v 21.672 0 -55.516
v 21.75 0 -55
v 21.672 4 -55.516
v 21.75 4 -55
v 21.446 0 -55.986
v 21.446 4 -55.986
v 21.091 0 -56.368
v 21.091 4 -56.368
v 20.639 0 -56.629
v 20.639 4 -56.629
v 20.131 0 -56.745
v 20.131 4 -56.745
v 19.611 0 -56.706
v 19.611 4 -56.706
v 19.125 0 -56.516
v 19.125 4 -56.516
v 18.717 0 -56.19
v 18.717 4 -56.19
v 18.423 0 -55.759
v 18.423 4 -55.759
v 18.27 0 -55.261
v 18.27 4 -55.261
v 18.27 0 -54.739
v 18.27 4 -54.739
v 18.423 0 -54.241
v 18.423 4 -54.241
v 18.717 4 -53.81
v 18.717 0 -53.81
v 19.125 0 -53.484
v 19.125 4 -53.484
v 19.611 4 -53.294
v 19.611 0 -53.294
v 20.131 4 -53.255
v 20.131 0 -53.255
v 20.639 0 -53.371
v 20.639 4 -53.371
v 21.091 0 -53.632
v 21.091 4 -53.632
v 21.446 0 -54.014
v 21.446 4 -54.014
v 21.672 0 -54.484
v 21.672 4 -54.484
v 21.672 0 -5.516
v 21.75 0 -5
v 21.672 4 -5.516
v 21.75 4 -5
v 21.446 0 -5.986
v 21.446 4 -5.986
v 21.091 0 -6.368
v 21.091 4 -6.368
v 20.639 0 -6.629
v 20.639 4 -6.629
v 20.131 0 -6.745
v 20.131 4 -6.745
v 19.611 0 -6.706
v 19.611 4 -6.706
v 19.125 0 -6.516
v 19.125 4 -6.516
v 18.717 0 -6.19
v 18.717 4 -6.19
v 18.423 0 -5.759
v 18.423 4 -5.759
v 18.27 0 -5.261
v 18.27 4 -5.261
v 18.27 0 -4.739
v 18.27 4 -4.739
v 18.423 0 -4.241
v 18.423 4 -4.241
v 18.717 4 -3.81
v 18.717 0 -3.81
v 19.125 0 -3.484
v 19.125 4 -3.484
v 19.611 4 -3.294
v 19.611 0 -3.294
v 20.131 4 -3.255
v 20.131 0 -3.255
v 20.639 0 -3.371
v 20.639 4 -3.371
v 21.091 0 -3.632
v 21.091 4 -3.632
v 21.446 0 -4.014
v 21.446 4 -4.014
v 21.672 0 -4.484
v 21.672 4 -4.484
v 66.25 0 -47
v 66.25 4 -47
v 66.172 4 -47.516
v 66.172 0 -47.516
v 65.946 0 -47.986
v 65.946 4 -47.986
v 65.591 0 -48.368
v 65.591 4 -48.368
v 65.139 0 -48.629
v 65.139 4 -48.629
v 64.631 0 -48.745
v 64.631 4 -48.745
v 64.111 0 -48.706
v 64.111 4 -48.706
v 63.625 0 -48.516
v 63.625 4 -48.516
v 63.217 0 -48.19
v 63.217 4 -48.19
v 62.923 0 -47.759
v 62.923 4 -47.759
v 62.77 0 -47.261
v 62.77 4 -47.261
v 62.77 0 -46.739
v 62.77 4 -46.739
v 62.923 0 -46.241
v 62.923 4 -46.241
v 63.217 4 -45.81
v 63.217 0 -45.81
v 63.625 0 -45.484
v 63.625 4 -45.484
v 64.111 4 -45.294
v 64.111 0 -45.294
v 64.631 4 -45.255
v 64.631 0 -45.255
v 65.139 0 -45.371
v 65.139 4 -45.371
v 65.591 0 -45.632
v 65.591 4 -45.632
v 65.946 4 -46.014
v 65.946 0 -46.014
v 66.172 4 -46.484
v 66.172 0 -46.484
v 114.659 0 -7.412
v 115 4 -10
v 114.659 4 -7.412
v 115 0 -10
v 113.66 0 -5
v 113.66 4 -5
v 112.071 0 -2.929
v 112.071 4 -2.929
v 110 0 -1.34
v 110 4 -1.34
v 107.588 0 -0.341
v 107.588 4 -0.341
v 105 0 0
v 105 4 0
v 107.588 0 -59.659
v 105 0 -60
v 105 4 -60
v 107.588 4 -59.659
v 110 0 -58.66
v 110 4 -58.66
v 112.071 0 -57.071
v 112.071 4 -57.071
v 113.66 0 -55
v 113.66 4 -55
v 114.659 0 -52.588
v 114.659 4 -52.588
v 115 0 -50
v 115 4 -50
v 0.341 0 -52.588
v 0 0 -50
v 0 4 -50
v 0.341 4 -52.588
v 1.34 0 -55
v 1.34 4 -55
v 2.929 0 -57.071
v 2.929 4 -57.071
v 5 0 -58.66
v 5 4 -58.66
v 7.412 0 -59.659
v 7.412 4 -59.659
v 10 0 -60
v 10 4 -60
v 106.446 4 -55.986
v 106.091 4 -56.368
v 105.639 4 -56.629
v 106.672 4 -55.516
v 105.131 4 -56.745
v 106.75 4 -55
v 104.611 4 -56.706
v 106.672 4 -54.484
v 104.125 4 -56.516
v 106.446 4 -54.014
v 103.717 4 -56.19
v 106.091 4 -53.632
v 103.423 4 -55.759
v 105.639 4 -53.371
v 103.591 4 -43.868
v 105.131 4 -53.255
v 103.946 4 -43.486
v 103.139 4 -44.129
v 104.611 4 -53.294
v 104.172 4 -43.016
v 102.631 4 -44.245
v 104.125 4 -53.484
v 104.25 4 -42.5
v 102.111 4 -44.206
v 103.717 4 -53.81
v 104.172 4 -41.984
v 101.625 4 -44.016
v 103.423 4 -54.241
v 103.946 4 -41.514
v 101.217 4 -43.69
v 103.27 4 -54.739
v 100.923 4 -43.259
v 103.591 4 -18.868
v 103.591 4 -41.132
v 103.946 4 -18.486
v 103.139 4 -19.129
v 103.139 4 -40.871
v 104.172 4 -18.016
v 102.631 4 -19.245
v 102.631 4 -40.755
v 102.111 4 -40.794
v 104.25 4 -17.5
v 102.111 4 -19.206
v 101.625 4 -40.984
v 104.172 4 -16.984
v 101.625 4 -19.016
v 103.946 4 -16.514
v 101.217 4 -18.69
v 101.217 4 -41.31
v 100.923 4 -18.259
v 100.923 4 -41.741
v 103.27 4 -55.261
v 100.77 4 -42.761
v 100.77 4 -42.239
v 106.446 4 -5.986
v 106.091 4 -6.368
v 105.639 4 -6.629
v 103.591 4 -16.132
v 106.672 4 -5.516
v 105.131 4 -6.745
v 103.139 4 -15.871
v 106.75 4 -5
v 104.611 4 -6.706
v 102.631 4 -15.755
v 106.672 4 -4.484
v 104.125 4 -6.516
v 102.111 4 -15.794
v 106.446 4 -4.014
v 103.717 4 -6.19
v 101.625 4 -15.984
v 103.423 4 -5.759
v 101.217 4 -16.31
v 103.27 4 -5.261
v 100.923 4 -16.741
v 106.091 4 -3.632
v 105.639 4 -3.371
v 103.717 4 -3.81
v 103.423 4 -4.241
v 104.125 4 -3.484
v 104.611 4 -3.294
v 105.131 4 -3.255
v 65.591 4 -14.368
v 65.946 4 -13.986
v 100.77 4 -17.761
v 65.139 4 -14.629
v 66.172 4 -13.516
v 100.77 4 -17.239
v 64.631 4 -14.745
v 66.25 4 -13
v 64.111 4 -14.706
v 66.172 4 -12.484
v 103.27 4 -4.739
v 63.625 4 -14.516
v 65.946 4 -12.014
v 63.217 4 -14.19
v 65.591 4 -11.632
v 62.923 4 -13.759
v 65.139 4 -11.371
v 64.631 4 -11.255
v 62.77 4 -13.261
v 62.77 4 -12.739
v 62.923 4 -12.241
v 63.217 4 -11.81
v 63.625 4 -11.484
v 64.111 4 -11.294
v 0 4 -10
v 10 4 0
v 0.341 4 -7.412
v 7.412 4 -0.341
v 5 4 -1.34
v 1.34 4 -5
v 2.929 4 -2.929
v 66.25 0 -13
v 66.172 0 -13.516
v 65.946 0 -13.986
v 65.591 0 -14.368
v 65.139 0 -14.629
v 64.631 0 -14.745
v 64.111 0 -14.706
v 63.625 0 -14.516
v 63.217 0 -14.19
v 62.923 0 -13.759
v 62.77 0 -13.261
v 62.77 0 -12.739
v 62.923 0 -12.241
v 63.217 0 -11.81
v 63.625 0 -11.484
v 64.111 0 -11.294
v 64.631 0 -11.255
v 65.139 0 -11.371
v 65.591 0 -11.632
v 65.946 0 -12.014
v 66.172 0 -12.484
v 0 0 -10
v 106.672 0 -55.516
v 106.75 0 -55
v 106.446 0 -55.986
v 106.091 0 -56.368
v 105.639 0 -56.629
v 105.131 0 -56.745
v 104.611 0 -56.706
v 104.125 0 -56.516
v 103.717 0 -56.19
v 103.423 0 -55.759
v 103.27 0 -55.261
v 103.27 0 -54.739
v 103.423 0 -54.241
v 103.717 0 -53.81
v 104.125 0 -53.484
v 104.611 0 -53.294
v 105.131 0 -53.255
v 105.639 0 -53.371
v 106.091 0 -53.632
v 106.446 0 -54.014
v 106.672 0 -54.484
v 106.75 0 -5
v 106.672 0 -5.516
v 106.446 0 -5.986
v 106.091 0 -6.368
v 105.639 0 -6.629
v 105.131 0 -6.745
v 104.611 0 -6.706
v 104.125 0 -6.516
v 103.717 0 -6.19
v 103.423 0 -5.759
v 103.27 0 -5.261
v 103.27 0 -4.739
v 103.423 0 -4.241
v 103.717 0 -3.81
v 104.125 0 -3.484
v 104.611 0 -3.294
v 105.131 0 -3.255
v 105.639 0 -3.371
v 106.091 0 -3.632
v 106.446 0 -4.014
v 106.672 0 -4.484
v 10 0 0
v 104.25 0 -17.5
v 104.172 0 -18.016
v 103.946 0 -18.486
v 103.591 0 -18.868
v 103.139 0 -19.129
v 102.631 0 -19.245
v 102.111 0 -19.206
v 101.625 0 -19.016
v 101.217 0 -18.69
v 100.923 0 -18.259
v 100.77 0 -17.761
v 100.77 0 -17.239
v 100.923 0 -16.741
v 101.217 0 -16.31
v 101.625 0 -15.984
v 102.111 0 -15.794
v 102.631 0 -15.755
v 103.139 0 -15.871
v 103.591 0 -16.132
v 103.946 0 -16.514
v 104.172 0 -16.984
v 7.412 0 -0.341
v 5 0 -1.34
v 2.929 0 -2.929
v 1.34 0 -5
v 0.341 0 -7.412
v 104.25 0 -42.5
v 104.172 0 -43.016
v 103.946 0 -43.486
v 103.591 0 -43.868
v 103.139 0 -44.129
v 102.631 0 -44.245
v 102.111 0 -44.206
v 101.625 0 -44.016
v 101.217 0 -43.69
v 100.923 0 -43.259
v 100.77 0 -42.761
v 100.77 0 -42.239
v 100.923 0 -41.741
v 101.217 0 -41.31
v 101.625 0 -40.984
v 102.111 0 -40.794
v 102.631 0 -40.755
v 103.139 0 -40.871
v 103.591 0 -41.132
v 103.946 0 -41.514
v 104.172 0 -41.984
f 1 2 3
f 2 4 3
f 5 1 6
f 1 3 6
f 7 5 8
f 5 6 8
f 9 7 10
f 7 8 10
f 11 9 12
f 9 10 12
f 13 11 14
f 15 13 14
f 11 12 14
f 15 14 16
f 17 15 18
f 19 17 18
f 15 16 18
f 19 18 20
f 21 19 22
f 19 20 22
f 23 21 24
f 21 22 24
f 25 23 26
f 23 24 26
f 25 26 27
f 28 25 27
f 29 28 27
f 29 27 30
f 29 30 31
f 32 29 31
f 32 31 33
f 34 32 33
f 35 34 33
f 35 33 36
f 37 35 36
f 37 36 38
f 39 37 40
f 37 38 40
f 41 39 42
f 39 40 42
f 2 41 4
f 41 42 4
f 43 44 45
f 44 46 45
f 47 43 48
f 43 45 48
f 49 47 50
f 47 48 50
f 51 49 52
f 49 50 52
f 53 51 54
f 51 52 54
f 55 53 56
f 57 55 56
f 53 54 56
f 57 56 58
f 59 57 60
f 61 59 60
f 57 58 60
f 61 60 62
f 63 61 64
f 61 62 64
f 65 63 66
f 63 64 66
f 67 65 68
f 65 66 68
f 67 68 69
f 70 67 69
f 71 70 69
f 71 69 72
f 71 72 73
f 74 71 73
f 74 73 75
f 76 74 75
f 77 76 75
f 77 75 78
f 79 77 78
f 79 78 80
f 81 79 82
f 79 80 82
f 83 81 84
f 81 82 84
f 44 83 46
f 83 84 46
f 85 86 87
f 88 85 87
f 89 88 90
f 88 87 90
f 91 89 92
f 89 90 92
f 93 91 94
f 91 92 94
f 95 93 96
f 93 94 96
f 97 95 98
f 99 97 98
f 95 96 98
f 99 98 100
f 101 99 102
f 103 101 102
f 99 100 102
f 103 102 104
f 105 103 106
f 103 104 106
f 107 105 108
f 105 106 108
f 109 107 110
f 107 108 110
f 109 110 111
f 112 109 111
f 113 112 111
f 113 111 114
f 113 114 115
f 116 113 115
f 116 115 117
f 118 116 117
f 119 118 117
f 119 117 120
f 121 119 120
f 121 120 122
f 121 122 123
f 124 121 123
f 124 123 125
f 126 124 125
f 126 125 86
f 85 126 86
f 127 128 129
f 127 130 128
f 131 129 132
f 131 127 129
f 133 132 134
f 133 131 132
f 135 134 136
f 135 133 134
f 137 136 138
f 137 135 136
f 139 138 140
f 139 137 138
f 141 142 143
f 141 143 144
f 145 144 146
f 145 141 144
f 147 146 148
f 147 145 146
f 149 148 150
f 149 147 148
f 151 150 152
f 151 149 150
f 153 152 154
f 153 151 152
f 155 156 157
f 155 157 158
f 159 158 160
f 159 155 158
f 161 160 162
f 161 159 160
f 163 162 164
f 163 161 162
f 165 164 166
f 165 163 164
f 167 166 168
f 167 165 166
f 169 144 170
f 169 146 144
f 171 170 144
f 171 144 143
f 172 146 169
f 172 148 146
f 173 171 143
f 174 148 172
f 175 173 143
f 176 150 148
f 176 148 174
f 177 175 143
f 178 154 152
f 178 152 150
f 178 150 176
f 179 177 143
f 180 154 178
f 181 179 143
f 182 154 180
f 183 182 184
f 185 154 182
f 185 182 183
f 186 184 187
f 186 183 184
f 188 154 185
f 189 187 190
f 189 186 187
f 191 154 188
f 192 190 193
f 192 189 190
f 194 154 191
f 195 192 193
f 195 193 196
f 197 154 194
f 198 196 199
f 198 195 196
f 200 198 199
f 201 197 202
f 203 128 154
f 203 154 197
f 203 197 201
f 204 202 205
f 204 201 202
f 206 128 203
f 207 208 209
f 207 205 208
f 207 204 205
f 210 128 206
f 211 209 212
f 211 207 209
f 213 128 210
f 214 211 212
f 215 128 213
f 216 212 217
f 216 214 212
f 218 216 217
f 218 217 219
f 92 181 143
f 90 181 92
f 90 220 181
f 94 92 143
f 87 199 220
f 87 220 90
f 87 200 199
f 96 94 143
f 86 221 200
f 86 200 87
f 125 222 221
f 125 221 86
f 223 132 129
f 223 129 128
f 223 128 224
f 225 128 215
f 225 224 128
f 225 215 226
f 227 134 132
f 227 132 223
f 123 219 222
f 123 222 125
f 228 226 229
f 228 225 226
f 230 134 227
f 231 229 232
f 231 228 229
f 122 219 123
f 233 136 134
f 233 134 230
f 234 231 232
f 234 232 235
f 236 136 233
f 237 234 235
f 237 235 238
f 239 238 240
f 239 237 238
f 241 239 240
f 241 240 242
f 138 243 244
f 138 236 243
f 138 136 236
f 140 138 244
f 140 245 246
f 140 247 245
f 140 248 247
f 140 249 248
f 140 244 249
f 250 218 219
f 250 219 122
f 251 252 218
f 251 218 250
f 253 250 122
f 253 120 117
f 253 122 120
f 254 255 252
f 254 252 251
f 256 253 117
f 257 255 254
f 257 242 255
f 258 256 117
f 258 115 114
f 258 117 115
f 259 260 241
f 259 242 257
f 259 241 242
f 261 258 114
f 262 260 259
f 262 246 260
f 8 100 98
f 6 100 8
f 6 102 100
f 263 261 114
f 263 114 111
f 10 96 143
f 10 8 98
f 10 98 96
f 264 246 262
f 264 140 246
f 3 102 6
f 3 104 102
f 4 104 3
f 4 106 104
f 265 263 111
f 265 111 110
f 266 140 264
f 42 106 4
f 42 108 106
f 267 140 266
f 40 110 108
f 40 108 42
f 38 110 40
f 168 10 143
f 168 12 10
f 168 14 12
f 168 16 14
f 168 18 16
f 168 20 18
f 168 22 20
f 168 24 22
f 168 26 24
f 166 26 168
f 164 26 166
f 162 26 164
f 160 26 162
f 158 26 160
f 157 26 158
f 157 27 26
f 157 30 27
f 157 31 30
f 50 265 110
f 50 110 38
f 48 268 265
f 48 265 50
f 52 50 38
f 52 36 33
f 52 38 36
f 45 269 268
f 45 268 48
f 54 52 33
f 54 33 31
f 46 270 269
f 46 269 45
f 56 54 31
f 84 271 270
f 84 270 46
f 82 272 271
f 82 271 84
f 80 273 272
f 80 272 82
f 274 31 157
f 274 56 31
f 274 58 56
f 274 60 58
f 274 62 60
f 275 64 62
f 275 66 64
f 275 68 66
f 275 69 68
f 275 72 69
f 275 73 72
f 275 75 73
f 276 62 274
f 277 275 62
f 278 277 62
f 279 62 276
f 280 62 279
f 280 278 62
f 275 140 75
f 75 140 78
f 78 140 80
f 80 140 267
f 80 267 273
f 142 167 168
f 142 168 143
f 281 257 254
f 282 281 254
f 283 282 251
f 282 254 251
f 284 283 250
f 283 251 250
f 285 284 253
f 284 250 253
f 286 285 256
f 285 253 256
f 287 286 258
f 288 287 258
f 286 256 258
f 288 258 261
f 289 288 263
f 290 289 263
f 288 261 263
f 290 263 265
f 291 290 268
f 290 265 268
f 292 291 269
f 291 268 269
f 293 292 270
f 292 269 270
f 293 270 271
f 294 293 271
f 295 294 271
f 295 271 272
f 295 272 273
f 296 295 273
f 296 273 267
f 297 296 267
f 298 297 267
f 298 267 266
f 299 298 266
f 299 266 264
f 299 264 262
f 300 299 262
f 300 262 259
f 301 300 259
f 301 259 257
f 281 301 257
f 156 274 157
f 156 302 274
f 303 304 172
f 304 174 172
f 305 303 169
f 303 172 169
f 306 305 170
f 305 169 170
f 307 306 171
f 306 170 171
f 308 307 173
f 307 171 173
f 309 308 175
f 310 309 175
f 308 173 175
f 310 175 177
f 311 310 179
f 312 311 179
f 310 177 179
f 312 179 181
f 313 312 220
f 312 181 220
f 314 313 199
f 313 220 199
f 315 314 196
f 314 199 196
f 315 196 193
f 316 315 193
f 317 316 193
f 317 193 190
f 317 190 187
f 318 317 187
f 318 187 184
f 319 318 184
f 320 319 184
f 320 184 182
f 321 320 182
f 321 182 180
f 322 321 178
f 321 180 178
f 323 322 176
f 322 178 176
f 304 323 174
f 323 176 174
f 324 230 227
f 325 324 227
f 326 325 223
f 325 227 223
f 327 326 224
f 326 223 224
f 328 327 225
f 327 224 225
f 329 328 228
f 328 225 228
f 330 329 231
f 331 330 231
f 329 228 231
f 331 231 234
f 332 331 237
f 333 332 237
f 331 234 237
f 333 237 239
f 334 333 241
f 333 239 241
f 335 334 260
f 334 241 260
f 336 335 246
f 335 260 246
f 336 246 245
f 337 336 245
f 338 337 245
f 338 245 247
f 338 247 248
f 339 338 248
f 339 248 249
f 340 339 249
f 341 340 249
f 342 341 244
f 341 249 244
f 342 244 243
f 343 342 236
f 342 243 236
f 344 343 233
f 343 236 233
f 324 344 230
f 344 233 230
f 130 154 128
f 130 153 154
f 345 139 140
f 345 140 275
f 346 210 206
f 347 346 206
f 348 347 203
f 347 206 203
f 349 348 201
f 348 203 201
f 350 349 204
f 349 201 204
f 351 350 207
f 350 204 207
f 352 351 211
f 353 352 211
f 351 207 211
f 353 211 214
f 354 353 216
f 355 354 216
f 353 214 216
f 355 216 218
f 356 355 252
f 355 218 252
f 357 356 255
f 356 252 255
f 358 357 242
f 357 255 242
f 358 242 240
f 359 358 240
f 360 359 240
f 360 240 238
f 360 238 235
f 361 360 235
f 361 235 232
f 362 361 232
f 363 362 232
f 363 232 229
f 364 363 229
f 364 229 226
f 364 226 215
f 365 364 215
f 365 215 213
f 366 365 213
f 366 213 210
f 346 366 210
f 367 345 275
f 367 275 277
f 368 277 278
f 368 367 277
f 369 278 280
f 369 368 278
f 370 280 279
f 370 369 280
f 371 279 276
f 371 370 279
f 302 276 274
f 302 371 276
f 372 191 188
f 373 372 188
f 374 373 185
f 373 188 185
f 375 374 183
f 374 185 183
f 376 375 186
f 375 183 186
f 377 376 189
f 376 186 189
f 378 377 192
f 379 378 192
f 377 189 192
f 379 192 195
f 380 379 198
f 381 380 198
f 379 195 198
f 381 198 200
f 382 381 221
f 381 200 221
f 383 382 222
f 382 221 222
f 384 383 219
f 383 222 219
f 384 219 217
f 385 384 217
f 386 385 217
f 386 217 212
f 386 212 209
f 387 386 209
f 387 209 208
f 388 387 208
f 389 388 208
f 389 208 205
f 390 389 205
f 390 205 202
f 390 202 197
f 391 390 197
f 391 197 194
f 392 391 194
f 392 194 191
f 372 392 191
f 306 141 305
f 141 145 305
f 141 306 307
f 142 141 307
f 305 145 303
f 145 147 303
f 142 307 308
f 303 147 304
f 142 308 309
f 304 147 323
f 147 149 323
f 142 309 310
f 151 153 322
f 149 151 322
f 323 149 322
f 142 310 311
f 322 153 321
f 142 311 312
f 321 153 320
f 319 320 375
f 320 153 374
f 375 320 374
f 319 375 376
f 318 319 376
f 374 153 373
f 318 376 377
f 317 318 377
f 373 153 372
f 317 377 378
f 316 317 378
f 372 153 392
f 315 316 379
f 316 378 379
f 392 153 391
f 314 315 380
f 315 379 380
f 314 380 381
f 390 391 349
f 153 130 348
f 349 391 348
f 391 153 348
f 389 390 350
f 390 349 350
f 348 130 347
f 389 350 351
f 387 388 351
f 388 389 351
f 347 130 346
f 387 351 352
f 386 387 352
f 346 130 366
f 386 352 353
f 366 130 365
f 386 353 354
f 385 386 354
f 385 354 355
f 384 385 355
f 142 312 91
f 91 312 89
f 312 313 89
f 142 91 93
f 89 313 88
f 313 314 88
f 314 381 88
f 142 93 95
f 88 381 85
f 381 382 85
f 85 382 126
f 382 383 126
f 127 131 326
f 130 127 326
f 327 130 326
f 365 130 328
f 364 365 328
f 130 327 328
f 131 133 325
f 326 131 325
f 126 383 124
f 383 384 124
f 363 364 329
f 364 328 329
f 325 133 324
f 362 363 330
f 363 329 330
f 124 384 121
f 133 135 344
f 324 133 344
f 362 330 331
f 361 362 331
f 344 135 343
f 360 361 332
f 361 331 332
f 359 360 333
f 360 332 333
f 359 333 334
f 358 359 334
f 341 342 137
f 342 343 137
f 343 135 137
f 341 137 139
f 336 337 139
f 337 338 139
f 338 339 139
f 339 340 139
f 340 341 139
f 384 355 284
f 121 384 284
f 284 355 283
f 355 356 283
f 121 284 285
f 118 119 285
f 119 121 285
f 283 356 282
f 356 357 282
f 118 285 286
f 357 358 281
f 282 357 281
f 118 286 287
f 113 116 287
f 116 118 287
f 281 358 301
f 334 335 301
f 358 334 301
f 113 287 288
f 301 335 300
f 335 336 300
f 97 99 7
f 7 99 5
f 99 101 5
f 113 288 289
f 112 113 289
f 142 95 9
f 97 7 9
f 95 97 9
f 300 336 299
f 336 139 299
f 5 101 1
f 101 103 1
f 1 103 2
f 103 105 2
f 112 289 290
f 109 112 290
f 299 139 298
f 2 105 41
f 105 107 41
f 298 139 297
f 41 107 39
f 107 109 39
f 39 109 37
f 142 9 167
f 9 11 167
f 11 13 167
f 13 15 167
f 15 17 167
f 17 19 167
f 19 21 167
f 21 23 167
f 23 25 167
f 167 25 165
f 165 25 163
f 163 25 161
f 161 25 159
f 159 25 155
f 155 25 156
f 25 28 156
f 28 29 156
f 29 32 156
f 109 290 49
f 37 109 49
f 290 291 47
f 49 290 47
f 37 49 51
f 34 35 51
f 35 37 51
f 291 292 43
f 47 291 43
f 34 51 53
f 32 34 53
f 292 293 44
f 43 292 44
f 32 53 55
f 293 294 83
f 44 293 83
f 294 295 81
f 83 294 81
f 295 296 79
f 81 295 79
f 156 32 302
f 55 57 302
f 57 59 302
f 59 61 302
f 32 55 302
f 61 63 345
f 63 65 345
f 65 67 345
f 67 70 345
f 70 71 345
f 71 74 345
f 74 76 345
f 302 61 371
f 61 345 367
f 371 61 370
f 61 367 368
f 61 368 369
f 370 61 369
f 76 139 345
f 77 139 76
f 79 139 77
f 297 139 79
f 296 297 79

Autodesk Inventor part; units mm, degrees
ref_plane "YZ Plane" through (0, 0, 0) normal (1, 0, 0) x (0, 1, 0)
ref_plane "XZ Plane" through (0, 0, 0) normal (0, 1, 0) x (-1, 0, 0)
ref_plane "XY Plane" through (0, 0, 0) normal (0, 0, 1) x (1, 0, 0)
sketch "Sketch1" plane through (0, 0, 0) normal (0, 1, 0) x (-1, 0, 0)
  line L0 (-10, -60) -> (-105, -60)
  line L1 (-115, -50) -> (-115, -10)
  line L2 (-105, 0) -> (-10, 0)
  line L3 (0, -10) -> (0, -50)
  arc A0 (-10, -60) -> (0, -50) centre (-10, -50) ccw
  arc A1 (0, -10) -> (-10, 0) centre (-10, -10) ccw
  arc A2 (-115, -50) -> (-105, -60) centre (-105, -50) ccw
  arc A3 (-105, 0) -> (-115, -10) centre (-105, -10) ccw
  point P0 (0, 0)
  point P1 (0, -60)
  point P2 (-115, 0)
  point P3 (-115, -60)
  point P4 (0, 0)
  dimension "d0" = 115
  dimension "d1" = 60
  dimension "d29" = 10
extrude "Extrusion1" add sketch "Sketch1" along normal blind 4
sketch "Sketch2" plane through (0, 4, 0) normal (0, 1, 0) x (1, 0, 0)
  circle A0 centre (20, 55) radius 1.75
  line L0 (105, 60) -> (10, 60) projected
  line L1 (0, 50) -> (0, 0) projected
  circle A1 centre (105, 55) radius 1.75
  circle A2 centre (20, 5) radius 1.75
  circle A3 centre (105, 5) radius 1.75
  circle A4 centre (102.5, 42.5) radius 1.75
  circle A5 centre (102.5, 17.5) radius 1.75
  line L2 (115, 10) -> (115, 50) projected
  circle A6 centre (64.5, 47) radius 1.75
  circle A7 centre (64.5, 13) radius 1.75
  point P0 (115, 60)
  point P1 (0, 60)
  point P2 (115, 0)
  dimension "d4" = 3.5
  dimension "d5" = 5
  dimension "d6" = 20
  dimension "d9" = 85
  dimension "d12" = 50
  dimension "d15" = 3.5
  dimension "d16" = 3.5
  dimension "d17" = 25
  dimension "d18" = 0
  dimension "d19" = 12.5
  dimension "d20" = 3.5
  dimension "d21" = 3.5
  dimension "d22" = 34
  dimension "d23" = 0
  dimension "d24" = 38
  dimension "d25" = 17.5
  dimension "d26" = 13
extrude "Extrusion2" cut sketch "Sketch2" against normal through all
properties part number "rfid_cover"
